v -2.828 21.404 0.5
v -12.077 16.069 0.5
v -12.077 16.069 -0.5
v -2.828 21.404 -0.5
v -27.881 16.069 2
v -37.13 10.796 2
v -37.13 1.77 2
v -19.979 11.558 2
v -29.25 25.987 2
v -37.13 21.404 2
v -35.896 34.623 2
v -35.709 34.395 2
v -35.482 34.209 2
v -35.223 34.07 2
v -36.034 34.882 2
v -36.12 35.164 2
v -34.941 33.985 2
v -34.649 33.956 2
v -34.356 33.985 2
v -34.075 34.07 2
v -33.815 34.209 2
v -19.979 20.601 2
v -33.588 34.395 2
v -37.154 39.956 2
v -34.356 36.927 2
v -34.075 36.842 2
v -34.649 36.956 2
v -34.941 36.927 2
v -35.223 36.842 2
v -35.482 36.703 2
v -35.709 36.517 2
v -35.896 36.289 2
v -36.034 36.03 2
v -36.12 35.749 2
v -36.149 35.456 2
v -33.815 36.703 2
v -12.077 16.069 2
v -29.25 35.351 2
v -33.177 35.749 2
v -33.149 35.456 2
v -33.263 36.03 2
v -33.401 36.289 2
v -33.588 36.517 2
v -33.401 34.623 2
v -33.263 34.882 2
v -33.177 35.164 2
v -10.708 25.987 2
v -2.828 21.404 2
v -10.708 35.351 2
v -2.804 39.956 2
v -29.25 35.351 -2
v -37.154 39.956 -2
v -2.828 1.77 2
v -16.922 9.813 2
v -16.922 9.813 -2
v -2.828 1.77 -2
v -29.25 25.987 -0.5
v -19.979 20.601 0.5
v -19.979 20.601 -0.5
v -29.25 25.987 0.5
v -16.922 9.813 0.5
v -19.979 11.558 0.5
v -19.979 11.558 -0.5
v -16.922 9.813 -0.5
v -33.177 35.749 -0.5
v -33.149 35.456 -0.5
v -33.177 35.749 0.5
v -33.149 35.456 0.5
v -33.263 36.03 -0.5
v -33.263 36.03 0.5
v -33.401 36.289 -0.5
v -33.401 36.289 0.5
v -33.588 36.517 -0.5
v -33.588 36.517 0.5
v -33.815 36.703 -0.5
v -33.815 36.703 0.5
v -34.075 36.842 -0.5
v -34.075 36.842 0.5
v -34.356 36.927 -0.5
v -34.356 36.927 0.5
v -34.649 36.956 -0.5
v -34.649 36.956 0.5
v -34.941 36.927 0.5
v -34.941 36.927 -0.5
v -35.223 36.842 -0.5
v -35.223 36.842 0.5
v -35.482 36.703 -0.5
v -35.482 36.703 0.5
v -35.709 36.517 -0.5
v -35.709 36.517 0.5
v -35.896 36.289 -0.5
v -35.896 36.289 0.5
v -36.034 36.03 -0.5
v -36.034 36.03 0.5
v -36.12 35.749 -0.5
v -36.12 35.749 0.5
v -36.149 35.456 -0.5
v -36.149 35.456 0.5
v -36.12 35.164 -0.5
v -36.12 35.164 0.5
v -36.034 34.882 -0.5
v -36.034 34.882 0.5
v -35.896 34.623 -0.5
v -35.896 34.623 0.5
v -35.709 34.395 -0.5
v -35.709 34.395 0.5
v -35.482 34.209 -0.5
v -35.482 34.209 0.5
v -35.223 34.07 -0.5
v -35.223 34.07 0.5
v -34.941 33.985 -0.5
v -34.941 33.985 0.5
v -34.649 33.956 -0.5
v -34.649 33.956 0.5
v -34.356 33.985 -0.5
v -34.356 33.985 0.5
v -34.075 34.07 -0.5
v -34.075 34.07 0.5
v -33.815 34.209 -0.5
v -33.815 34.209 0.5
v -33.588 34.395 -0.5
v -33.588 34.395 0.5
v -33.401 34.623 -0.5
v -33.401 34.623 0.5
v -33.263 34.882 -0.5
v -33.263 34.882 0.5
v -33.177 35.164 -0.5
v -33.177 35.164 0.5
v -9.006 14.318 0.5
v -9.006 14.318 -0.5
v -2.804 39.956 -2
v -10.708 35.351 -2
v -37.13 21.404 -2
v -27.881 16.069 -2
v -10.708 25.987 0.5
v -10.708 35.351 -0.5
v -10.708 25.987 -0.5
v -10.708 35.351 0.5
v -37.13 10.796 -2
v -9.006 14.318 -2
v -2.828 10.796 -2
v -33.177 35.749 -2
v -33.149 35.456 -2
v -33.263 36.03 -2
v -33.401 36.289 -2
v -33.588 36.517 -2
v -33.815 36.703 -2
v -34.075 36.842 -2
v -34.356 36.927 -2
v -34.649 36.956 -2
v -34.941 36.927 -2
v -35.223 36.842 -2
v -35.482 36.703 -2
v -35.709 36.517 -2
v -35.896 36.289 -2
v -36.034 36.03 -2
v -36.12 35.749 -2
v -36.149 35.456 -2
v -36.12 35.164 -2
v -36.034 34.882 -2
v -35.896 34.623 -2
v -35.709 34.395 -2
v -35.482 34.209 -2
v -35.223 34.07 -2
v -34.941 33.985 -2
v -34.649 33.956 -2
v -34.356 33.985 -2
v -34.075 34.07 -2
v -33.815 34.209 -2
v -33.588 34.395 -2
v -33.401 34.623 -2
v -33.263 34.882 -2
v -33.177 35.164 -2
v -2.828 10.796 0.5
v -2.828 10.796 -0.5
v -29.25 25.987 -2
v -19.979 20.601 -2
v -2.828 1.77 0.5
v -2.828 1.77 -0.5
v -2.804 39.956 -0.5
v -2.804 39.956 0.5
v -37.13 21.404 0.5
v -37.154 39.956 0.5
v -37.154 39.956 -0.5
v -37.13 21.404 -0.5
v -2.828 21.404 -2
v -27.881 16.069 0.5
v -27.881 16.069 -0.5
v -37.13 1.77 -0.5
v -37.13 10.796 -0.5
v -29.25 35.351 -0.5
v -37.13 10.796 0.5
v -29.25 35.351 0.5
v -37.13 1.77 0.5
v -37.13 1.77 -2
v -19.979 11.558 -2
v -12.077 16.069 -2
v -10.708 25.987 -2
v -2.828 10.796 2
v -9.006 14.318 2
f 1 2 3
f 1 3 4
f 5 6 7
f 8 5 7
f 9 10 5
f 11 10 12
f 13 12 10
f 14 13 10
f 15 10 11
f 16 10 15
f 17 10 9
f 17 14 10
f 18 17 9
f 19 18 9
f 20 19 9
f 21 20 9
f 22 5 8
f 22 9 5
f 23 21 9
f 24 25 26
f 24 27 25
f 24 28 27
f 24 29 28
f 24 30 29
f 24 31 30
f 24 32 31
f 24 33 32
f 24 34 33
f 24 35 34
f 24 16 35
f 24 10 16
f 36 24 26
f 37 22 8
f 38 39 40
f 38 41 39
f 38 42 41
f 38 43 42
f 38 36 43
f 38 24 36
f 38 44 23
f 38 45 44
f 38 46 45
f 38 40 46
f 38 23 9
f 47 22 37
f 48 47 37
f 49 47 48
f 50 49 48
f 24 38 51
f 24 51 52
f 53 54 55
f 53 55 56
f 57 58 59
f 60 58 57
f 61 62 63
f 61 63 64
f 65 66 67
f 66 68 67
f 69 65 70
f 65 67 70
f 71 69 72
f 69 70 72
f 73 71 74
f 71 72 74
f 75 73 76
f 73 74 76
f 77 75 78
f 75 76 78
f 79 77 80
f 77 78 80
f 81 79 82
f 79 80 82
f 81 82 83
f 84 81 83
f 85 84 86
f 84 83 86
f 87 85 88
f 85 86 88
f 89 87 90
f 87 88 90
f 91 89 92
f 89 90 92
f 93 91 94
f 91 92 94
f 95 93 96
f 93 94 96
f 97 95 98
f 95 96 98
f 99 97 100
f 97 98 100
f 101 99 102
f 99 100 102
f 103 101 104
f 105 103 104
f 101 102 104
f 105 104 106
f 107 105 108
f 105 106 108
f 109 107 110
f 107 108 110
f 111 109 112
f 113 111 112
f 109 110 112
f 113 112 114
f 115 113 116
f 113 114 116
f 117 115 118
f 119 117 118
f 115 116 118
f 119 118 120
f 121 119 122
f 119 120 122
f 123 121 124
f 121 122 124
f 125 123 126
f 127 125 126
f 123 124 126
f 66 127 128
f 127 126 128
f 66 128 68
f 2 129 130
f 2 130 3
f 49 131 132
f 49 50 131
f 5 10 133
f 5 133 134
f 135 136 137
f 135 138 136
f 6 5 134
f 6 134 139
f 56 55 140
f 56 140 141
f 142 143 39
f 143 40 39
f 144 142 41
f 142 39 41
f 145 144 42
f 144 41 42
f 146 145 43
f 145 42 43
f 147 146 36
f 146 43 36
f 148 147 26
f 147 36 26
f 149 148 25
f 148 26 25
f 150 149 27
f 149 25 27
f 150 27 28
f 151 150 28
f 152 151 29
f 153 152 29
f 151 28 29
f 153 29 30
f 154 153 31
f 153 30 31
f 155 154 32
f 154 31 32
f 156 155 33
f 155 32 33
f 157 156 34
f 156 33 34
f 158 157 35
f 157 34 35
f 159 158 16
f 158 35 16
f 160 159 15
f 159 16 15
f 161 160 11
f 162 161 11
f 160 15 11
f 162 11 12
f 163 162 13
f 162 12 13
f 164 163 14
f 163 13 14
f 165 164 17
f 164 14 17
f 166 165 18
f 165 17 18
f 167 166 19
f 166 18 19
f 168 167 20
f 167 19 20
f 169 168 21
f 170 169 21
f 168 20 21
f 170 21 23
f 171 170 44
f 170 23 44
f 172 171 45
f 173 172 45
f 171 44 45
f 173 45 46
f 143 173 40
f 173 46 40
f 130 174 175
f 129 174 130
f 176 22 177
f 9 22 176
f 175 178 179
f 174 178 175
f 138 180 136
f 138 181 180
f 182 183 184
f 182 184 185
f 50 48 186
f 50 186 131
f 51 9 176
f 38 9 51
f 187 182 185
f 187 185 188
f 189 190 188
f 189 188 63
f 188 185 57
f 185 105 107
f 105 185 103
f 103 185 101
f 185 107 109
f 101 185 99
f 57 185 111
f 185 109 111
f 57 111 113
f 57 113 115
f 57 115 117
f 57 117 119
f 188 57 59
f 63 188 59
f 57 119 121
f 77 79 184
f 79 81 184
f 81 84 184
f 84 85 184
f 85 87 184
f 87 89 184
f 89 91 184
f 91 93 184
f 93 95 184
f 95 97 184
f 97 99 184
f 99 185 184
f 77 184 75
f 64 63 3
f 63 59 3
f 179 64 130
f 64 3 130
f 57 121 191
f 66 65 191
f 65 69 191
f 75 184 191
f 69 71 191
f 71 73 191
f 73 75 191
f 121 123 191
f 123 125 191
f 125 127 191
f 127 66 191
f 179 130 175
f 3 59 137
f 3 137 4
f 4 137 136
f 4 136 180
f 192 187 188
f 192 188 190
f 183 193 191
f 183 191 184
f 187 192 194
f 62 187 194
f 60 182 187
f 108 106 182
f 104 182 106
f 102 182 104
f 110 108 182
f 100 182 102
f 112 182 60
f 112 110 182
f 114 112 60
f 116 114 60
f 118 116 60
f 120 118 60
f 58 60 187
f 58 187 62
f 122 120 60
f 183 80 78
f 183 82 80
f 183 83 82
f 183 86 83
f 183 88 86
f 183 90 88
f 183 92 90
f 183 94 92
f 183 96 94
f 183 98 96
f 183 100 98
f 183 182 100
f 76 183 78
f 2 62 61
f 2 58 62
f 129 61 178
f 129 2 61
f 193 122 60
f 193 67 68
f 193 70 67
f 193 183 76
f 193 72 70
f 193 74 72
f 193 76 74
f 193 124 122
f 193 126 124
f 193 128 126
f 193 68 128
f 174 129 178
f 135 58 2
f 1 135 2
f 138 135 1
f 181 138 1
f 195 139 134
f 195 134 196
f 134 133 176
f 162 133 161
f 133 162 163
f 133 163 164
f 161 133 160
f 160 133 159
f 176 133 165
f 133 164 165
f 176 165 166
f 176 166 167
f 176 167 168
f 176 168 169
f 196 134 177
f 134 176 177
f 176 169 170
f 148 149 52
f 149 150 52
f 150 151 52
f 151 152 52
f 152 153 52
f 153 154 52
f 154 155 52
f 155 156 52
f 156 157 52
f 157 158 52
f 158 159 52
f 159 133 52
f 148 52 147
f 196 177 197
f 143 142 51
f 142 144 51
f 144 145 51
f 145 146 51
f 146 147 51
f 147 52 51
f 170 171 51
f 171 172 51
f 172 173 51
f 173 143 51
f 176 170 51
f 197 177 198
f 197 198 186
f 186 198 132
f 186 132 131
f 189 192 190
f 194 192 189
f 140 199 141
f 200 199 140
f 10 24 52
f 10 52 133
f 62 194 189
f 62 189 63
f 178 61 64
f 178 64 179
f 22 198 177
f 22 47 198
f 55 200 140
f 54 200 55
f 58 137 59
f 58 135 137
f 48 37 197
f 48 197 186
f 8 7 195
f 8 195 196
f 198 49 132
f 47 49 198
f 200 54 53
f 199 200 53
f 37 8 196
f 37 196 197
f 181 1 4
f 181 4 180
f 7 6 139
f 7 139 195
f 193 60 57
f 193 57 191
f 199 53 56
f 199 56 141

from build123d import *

# Parameters (mm, degrees)
F1_DEPTH = 0.5
F2_DEPTH = 2
F3_R     = 1.5
F4_DEPTH = 12.5


with BuildPart() as f1:
    # F0 (on Top) → F1 (new body, symmetric)
    with BuildSketch(Plane.XY):
        Polygon((-10.708367452, 25.9872935712), (-19.9792031199, 20.6009205431), (-19.9792031199, 11.5576852113), (-12.0769068599, 16.0685218871), (-2.8281658888, 21.4038528502), (-2.8039515018, 39.956137538), (-10.708367452, 35.3513844311), align=None)
        Polygon((-29.2500387877, 35.3513844311), (-37.1544547379, 39.956137538), (-37.130240351, 21.4038528502), (-27.8814993799, 16.0685218871), (-37.130240351, 10.7959629968), (-37.130240351, 1.7703475896), (-19.9792031199, 11.5576852113), (-19.9792031199, 20.6009205431), (-29.2500387877, 25.9872935712), align=None)
        Polygon((-12.0769068599, 16.0685218871), (-19.9792031199, 11.5576852113), (-16.9217958666, 9.8129582521), (-9.0056933559, 14.3176723266), align=None)
        Polygon((-9.0056933559, 14.3176723266), (-16.9217958666, 9.8129582521), (-2.8281658888, 1.7703475896), (-2.8281658888, 10.7959629968), align=None)
    extrude(amount=F1_DEPTH, both=True)


with BuildPart() as f2:
    # F0 (on Top) → F2 (new body, symmetric)
    with BuildSketch(Plane.XY):
        Polygon((-9.0056933559, 14.3176723266), (-16.9217958666, 9.8129582521), (-2.8281658888, 1.7703475896), (-2.8281658888, 10.7959629968), align=None)
    extrude(amount=F2_DEPTH, both=True)


with BuildPart() as f2b:
    # F0 (on Top) → F2, piece 2 (new body, symmetric)
    with BuildSketch(Plane.XY):
        Polygon((-10.708367452, 25.9872935712), (-19.9792031199, 20.6009205431), (-19.9792031199, 11.5576852113), (-12.0769068599, 16.0685218871), (-2.8281658888, 21.4038528502), (-2.8039515018, 39.956137538), (-10.708367452, 35.3513844311), align=None)
        Polygon((-29.2500387877, 35.3513844311), (-37.1544547379, 39.956137538), (-37.130240351, 21.4038528502), (-27.8814993799, 16.0685218871), (-37.130240351, 10.7959629968), (-37.130240351, 1.7703475896), (-19.9792031199, 11.5576852113), (-19.9792031199, 20.6009205431), (-29.2500387877, 25.9872935712), align=None)
    extrude(amount=F2_DEPTH, both=True)


with BuildPart() as f4_tool:
    # F3 (on face) → F4 (new body, symmetric)
    with BuildSketch(Plane.XY.offset(2)):
        with Locations((-34.6485792218, 35.456137538)):
            Circle(F3_R)
    extrude(amount=F4_DEPTH, both=True)


with BuildPart() as f1_1:
    add(f1.part)

    # F4: cut by f4_tool
    add(f4_tool.part, mode=Mode.SUBTRACT)


with BuildPart() as f2b_1:
    add(f2b.part)

    # F4: cut by f4_tool
    add(f4_tool.part, mode=Mode.SUBTRACT)


solid = Compound([f2.part, f1_1.part, f2b_1.part])
